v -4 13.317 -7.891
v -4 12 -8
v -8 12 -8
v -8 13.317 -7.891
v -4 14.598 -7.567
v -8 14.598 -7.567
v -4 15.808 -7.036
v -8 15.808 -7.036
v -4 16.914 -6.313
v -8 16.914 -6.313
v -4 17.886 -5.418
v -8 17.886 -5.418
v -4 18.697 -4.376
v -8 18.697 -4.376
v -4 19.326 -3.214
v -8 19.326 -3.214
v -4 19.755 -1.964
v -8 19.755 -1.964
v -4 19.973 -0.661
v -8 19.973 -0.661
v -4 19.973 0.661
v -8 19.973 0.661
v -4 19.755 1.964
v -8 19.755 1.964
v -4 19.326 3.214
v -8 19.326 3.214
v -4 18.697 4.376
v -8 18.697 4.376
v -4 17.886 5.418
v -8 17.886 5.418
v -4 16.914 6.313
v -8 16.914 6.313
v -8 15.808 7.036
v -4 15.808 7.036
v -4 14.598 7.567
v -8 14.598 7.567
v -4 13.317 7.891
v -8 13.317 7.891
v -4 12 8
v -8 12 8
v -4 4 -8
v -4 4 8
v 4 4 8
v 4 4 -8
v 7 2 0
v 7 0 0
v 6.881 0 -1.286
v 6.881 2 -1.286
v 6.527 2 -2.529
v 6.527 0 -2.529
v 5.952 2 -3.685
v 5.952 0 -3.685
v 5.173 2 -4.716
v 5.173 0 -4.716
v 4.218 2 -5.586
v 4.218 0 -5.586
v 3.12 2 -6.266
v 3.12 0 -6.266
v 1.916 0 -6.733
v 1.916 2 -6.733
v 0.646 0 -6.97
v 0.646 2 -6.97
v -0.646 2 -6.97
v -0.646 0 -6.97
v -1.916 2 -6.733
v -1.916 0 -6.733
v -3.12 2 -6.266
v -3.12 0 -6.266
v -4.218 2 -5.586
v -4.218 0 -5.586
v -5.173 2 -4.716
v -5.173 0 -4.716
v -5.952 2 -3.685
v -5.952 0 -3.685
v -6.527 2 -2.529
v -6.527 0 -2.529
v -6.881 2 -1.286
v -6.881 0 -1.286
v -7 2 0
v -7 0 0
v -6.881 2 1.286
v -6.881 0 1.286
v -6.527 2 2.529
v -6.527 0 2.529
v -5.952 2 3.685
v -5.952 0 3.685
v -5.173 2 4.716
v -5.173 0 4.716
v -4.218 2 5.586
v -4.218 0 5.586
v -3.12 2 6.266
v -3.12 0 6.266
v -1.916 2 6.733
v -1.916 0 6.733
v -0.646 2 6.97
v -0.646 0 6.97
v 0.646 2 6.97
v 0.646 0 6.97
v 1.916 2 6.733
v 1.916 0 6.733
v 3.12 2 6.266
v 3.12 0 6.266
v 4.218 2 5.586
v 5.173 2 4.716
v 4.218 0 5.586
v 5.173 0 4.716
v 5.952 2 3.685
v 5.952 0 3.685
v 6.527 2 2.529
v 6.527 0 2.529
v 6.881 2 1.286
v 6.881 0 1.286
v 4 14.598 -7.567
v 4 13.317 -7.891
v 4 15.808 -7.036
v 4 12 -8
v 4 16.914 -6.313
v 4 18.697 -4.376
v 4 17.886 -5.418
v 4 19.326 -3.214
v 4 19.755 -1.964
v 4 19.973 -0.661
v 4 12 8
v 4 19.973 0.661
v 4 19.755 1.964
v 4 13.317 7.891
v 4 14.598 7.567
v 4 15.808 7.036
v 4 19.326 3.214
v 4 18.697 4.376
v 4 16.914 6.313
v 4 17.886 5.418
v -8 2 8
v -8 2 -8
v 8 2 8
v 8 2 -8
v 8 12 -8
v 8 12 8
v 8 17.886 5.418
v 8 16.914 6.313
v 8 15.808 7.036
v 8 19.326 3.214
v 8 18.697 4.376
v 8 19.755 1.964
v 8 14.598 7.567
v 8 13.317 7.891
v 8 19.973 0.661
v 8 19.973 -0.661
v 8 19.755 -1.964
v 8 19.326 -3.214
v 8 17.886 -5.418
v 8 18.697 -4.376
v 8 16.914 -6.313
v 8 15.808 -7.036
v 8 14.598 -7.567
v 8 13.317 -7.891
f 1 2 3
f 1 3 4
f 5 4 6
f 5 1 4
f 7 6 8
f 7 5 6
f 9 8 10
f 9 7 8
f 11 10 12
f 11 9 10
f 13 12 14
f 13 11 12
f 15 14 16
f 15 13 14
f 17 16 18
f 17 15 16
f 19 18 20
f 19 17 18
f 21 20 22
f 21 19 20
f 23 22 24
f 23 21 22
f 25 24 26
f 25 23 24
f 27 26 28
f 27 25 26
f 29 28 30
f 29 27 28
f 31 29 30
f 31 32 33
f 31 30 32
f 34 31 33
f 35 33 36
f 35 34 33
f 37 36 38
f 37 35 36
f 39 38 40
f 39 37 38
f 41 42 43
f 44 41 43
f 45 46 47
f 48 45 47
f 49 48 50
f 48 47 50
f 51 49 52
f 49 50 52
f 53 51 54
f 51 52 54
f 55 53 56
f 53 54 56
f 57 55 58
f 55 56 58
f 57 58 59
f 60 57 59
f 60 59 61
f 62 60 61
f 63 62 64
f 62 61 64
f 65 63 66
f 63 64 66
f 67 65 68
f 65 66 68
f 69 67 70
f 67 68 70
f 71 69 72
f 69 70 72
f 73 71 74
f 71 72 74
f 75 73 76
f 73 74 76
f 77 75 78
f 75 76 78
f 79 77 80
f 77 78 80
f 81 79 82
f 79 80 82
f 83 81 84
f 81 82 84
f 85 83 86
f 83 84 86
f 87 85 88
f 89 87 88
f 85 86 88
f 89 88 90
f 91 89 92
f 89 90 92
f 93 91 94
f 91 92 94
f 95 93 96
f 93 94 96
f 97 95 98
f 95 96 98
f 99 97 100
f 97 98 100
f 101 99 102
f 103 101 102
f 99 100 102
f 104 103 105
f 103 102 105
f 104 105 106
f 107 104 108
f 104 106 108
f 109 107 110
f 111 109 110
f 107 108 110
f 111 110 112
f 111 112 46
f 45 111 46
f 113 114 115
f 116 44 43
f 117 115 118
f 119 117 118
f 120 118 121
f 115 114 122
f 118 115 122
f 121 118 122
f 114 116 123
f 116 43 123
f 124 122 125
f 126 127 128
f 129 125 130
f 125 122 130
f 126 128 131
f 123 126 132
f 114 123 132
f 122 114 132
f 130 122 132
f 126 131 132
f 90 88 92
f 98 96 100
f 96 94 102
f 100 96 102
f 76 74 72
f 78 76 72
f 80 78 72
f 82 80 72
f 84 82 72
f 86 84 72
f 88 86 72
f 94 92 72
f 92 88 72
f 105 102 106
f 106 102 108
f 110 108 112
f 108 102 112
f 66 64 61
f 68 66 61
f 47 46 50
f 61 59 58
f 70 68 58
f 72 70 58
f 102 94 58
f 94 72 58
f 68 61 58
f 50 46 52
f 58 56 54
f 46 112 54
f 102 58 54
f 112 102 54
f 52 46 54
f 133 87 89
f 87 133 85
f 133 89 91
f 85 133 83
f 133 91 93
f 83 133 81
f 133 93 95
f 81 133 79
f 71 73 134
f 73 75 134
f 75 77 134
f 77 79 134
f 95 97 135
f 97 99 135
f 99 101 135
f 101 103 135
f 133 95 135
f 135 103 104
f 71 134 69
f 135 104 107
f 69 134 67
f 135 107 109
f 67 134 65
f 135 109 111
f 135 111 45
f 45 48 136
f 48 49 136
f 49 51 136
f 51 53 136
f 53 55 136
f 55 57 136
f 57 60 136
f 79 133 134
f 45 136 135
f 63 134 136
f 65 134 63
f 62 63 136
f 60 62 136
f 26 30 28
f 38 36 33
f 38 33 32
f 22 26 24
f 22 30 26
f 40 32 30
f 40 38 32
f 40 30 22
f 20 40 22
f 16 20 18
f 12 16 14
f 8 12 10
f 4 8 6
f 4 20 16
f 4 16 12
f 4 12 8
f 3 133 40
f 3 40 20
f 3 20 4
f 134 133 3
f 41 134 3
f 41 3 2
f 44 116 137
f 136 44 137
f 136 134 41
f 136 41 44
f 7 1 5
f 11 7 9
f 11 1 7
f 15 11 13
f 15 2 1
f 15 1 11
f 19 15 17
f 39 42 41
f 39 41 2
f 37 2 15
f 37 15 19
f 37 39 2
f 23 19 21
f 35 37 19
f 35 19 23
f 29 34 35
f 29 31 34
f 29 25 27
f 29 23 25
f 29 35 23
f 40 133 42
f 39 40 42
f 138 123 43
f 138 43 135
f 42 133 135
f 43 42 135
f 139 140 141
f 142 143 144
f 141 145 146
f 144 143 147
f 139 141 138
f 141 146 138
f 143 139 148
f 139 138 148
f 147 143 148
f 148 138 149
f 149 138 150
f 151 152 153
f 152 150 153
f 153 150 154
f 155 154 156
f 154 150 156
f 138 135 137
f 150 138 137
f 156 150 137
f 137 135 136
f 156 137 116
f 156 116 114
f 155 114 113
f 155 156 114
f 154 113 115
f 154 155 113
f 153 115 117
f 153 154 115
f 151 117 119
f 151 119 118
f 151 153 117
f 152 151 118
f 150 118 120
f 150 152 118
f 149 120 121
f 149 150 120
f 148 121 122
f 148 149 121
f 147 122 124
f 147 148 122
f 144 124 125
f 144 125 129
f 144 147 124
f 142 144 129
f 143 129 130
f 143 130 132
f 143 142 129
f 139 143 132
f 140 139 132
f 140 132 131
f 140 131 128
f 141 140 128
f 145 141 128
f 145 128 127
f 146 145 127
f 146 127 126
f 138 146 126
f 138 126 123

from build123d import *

# Parameters (mm, degrees)
SKETCH_1_R          = 7
EXTRUDE_1_DEPTH     = 2
SKETCH_2_W          = 16
SKETCH_2_H          = 16
EXTRUDE_2_DEPTH     = 18
SKETCH_3_W          = 8
SKETCH_3_H          = 16
CUT_EXTRUDE_1_DEPTH = 16
CUT_EXTRUDE_2_DEPTH = 16


with BuildPart() as part:
    # 草图1 → 凸台-拉伸1 (new body)
    with BuildSketch(Plane(origin=(0, 0, 0), x_dir=(1, 0, 0), z_dir=(0, 1, 0))):
        Circle(SKETCH_1_R)
    extrude(amount=EXTRUDE_1_DEPTH)

    # 草图2 → 凸台-拉伸2 (add)
    with BuildSketch(Plane(origin=(0, 2, 0), x_dir=(1, 0, 0), z_dir=(0, 1, 0))):
        Rectangle(SKETCH_2_W, SKETCH_2_H)
    extrude(amount=EXTRUDE_2_DEPTH)

    # 草图3 → 切除-拉伸1 (cut)
    with BuildSketch(Plane.XY.offset(8)):
        with Locations((0, 12)):
            Rectangle(SKETCH_3_W, SKETCH_3_H)
    extrude(amount=-CUT_EXTRUDE_1_DEPTH, mode=Mode.SUBTRACT)

    # 草图4 → 切除-拉伸2 (cut)
    with BuildSketch(Plane(origin=(8, 0, 0), x_dir=(0, 0, -1), z_dir=(1, 0, 0))):
        with BuildLine():
            Line((-8, 12), (-8, 21.557868838))
            Line((-8, 21.557868838), (8, 21.557868838))
            Line((8, 21.557868838), (8, 12))
            ThreePointArc((8, 12), (0, 20), (-8, 12))
        make_face()
    extrude(amount=-CUT_EXTRUDE_2_DEPTH, mode=Mode.SUBTRACT)


solid = part.part
